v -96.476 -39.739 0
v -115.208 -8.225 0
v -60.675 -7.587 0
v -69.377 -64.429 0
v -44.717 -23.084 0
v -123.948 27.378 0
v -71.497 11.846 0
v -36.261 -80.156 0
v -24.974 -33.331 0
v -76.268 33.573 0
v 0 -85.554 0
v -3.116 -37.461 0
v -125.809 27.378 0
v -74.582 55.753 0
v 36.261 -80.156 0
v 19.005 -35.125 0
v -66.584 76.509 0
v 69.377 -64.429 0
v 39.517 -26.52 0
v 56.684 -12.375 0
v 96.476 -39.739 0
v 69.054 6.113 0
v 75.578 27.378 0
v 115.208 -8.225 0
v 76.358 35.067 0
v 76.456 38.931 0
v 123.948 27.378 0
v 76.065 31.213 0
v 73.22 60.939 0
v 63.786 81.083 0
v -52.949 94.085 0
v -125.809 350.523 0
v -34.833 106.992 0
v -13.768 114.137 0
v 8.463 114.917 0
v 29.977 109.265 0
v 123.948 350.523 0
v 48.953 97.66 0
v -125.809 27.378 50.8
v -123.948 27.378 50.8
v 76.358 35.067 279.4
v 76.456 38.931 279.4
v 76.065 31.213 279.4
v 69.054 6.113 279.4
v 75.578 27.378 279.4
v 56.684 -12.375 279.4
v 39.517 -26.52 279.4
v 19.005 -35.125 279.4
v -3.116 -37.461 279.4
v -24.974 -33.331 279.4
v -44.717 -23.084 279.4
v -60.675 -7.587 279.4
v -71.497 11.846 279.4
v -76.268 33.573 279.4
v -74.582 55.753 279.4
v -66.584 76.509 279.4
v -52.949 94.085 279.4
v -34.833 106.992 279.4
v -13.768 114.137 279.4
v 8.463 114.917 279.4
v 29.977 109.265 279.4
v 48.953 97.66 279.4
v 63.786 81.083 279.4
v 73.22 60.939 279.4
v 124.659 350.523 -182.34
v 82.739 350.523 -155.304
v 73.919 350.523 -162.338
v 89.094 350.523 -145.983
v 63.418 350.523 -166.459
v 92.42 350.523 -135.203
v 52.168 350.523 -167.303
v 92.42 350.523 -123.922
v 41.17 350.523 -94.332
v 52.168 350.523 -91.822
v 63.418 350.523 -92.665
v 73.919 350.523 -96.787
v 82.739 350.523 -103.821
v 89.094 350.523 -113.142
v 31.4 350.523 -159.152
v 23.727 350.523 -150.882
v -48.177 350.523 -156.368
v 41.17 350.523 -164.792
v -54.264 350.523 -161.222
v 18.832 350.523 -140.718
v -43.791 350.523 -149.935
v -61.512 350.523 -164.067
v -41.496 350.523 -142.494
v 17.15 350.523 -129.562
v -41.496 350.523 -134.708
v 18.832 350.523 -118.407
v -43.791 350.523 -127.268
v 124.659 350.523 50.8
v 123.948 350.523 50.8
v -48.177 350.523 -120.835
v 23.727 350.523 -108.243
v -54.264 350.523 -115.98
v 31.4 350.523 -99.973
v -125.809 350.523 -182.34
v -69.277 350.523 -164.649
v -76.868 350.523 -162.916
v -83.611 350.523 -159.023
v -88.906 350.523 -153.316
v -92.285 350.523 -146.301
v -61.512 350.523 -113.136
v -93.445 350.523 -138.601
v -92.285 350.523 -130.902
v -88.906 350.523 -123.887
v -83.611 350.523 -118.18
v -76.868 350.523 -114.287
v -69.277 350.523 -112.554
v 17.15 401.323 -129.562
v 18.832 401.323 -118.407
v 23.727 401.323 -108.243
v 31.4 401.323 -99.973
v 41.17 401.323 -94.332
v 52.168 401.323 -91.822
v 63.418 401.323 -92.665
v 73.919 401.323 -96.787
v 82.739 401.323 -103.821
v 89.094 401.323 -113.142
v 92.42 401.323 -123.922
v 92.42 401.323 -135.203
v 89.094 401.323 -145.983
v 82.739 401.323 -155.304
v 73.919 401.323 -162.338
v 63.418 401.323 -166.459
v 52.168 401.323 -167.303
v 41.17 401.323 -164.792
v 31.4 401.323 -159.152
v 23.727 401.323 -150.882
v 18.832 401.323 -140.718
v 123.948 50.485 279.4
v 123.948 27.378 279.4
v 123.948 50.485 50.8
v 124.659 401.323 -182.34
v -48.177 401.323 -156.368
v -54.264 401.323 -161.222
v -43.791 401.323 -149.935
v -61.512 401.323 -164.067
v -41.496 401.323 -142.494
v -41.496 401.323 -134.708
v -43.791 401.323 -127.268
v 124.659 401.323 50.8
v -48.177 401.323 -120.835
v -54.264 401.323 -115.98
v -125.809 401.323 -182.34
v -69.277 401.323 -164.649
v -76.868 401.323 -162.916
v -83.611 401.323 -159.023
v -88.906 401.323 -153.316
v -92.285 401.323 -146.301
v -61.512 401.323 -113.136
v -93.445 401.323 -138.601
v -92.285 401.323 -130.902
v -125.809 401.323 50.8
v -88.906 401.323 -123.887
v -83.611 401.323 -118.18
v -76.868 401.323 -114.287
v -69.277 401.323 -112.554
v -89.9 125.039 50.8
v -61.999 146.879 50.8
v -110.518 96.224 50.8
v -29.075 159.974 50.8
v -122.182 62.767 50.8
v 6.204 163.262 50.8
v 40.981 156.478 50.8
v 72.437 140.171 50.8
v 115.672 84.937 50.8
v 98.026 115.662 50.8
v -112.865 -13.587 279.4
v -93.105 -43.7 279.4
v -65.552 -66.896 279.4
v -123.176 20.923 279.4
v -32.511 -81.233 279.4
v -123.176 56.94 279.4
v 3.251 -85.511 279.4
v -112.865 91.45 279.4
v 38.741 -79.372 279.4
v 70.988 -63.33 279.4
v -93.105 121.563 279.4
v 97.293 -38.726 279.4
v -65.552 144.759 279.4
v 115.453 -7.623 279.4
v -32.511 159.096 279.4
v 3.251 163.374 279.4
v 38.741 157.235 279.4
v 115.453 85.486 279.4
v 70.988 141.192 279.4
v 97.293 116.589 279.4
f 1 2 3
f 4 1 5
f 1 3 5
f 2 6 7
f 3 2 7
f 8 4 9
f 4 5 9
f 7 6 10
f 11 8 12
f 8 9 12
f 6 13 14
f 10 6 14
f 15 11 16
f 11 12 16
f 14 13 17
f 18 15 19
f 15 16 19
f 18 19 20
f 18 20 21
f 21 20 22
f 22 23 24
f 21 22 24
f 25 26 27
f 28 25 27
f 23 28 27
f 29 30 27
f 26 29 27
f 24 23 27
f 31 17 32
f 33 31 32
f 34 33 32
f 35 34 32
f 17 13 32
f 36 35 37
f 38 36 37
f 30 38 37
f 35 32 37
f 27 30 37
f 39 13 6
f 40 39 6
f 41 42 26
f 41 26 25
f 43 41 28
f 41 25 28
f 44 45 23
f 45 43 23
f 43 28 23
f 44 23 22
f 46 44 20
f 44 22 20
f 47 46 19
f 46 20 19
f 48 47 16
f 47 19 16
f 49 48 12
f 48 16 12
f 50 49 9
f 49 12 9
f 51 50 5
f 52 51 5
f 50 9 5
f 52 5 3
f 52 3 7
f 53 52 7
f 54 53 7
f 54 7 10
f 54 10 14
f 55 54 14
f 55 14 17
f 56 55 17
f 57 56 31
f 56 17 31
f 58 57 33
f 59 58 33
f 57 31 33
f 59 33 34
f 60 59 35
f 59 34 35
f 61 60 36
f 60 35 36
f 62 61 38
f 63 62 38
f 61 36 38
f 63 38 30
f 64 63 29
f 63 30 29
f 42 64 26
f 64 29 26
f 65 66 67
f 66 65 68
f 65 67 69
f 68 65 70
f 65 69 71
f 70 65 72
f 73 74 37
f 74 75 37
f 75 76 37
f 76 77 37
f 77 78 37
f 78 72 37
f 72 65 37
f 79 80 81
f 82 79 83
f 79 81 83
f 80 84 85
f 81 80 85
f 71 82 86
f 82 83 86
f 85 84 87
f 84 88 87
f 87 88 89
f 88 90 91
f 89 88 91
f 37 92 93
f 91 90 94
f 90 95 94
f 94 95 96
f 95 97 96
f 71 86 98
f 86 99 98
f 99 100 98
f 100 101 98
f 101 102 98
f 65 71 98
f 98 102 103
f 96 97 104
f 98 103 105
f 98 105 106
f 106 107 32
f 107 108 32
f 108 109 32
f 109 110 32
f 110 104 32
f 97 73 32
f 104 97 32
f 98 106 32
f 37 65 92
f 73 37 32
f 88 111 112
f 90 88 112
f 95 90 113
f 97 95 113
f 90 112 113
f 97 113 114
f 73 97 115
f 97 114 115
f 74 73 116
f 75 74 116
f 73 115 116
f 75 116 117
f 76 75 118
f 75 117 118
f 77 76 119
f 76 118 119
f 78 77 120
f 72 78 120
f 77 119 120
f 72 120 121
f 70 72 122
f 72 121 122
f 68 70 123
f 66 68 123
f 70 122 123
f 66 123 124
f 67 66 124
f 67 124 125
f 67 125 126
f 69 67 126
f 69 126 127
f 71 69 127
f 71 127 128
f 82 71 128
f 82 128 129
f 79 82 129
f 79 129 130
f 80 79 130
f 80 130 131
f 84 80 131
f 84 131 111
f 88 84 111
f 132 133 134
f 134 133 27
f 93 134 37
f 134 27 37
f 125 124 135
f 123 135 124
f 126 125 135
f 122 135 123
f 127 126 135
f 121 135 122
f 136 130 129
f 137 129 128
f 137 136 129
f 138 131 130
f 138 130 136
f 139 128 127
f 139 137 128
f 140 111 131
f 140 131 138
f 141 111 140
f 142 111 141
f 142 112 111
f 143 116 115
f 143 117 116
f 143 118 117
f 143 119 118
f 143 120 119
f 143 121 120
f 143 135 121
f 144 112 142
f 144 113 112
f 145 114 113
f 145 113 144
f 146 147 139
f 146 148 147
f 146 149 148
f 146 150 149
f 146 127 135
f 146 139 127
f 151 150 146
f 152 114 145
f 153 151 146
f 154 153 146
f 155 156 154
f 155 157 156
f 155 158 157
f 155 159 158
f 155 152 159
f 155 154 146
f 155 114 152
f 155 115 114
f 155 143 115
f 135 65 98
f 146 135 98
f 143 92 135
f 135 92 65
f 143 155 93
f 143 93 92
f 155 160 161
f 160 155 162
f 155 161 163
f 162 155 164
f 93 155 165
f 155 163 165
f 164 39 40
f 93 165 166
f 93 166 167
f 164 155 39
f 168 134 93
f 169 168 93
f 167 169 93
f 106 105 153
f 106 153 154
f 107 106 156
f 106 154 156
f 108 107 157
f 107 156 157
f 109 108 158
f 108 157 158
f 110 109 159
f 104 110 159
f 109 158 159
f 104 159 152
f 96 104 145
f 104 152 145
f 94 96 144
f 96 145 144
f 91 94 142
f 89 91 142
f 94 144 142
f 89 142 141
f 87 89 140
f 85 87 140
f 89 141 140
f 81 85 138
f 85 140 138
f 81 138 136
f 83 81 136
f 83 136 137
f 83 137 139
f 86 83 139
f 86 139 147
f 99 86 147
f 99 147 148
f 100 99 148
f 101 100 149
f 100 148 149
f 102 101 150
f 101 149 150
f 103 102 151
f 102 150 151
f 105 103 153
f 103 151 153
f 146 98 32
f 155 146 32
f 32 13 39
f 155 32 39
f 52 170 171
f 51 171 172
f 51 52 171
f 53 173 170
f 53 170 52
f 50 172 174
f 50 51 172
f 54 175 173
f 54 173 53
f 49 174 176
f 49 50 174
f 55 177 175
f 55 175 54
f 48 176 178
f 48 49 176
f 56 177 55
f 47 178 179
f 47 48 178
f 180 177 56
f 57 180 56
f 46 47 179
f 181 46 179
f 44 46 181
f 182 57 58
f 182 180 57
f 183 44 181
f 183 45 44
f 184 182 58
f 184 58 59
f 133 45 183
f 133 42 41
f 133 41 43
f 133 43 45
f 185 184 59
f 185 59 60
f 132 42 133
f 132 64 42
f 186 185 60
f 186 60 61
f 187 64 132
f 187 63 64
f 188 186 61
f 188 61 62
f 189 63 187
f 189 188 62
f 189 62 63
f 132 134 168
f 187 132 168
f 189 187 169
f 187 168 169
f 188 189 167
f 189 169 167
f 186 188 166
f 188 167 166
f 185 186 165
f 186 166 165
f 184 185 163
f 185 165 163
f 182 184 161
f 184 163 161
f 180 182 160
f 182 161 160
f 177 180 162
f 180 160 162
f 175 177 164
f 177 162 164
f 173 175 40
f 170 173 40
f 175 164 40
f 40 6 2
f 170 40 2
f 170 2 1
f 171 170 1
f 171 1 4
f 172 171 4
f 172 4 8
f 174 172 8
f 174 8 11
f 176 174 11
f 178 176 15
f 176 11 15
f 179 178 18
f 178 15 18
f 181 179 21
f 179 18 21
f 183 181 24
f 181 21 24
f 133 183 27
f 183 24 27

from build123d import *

# Parameters (mm, degrees)
F6_DEPTH  = 25.4
F1_DEPTH  = 254
F7_DEPTH  = 50.8
F8_W      = 249.756782063
F8_H      = 50.8
F2_DEPTH  = 50.8
F9_R      = 26.1205140938
F10_DEPTH = 25.4
F11_DEPTH = 25.4
F3_R      = 37.8459994155
F4_DEPTH  = 558.8


with BuildPart() as f6:
    # F0 (on Top) → F6 (new body)
    with BuildSketch(Plane.XY):
        with BuildLine():
            ThreePointArc((-123.9480513415, 27.3783540638), (0, -85.553869405), (123.9480513415, 27.3783540638))
            Line((123.9480513415, 27.3783540638), (75.5778377526, 27.3783540638))
            ThreePointArc((75.5778377526, 27.3783540638), (0, -37.5243171246), (-75.5778377526, 27.3783540638))
            Line((-75.5778377526, 27.3783540638), (-123.9480513415, 27.3783540638))
        make_face()
        with BuildLine():
            Line((75.5778377526, 27.3783540638), (123.9480513415, 27.3783540638))
            Line((123.9480513415, 27.3783540638), (123.9480513415, 50.4845345108))
            ThreePointArc((123.9480513415, 50.4845345108), (-11.5530902235, 162.8794956288), (-123.9480513415, 27.3783540638))
            Line((-123.9480513415, 27.3783540638), (-75.5778377526, 27.3783540638))
            ThreePointArc((-75.5778377526, 27.3783540638), (-5.7931995405, 115.1674088457), (76.4557614119, 38.9314442873))
            ThreePointArc((76.4557614119, 38.9314442873), (76.2359645584, 33.1382447468), (75.5778377526, 27.3783540638))
        make_face()
    extrude(amount=F6_DEPTH)

    # F1 (add): a face of the model
    f1_faces = [f6.faces().sort_by_distance(p)[0] for p in [
        (120.4308719295, 38.9314442873, 25.4),
    ]]
    extrude(f1_faces, amount=F1_DEPTH)

    # F0 (on Top) → F7 (join)
    with BuildSketch(Plane.XY):
        with BuildLine():
            Line((-125.8087307215, 27.3783540638), (-123.9480513415, 27.3783540638))
            ThreePointArc((-123.9480513415, 27.3783540638), (-11.5530902235, 162.8794956288), (123.9480513415, 50.4845345108))
            Line((123.9480513415, 50.4845345108), (123.9480513415, 350.5234718323))
            Line((123.9480513415, 350.5234718323), (-125.8087307215, 350.5234718323))
            Line((-125.8087307215, 350.5234718323), (-125.8087307215, 27.3783540638))
        make_face()
    extrude(amount=F7_DEPTH)

    # F8 (on face) → F2 (join)
    with BuildSketch(Plane(origin=(0, 350.5234718323, 0), x_dir=(-1, 0, 0), z_dir=(0, 1, 0))):
        Polygon((-123.9480513415, 0), (-123.9480513415, 50.8), (-124.6591806412, 50.8), (-124.6591806412, -182.3397576809), (125.8087307215, -182.3397576809), (125.8087307215, 0), align=None)
        with Locations((0.93033969, 25.4)):
            Rectangle(F8_W, F8_H)
    extrude(amount=F2_DEPTH)

    # F9 (on face) → F10 (cut)
    with BuildSketch(Plane(origin=(0, 401.3234718323, 0), x_dir=(-1, 0, 0), z_dir=(0, 1, 0))):
        with Locations((67.3247128725, -138.6014223099)):
            Circle(F9_R)
    extrude(amount=-F10_DEPTH, mode=Mode.SUBTRACT)

    # F11 (cut): a face of the model
    f11_faces = [f6.faces().sort_by_distance(p)[0] for p in [
        (-67.3247128725, 375.9234718323, -138.6014223099),
    ]]
    extrude(f11_faces, amount=-F11_DEPTH, mode=Mode.SUBTRACT)

    # F3 (on face) → F4 (cut)
    with BuildSketch(Plane(origin=(0, 401.3234718323, 0), x_dir=(-1, 0, 0), z_dir=(0, 1, 0))):
        with Locations((-54.9964085221, -129.5623332262)):
            Circle(F3_R)
    extrude(amount=-F4_DEPTH, mode=Mode.SUBTRACT)


solid = f6.part
